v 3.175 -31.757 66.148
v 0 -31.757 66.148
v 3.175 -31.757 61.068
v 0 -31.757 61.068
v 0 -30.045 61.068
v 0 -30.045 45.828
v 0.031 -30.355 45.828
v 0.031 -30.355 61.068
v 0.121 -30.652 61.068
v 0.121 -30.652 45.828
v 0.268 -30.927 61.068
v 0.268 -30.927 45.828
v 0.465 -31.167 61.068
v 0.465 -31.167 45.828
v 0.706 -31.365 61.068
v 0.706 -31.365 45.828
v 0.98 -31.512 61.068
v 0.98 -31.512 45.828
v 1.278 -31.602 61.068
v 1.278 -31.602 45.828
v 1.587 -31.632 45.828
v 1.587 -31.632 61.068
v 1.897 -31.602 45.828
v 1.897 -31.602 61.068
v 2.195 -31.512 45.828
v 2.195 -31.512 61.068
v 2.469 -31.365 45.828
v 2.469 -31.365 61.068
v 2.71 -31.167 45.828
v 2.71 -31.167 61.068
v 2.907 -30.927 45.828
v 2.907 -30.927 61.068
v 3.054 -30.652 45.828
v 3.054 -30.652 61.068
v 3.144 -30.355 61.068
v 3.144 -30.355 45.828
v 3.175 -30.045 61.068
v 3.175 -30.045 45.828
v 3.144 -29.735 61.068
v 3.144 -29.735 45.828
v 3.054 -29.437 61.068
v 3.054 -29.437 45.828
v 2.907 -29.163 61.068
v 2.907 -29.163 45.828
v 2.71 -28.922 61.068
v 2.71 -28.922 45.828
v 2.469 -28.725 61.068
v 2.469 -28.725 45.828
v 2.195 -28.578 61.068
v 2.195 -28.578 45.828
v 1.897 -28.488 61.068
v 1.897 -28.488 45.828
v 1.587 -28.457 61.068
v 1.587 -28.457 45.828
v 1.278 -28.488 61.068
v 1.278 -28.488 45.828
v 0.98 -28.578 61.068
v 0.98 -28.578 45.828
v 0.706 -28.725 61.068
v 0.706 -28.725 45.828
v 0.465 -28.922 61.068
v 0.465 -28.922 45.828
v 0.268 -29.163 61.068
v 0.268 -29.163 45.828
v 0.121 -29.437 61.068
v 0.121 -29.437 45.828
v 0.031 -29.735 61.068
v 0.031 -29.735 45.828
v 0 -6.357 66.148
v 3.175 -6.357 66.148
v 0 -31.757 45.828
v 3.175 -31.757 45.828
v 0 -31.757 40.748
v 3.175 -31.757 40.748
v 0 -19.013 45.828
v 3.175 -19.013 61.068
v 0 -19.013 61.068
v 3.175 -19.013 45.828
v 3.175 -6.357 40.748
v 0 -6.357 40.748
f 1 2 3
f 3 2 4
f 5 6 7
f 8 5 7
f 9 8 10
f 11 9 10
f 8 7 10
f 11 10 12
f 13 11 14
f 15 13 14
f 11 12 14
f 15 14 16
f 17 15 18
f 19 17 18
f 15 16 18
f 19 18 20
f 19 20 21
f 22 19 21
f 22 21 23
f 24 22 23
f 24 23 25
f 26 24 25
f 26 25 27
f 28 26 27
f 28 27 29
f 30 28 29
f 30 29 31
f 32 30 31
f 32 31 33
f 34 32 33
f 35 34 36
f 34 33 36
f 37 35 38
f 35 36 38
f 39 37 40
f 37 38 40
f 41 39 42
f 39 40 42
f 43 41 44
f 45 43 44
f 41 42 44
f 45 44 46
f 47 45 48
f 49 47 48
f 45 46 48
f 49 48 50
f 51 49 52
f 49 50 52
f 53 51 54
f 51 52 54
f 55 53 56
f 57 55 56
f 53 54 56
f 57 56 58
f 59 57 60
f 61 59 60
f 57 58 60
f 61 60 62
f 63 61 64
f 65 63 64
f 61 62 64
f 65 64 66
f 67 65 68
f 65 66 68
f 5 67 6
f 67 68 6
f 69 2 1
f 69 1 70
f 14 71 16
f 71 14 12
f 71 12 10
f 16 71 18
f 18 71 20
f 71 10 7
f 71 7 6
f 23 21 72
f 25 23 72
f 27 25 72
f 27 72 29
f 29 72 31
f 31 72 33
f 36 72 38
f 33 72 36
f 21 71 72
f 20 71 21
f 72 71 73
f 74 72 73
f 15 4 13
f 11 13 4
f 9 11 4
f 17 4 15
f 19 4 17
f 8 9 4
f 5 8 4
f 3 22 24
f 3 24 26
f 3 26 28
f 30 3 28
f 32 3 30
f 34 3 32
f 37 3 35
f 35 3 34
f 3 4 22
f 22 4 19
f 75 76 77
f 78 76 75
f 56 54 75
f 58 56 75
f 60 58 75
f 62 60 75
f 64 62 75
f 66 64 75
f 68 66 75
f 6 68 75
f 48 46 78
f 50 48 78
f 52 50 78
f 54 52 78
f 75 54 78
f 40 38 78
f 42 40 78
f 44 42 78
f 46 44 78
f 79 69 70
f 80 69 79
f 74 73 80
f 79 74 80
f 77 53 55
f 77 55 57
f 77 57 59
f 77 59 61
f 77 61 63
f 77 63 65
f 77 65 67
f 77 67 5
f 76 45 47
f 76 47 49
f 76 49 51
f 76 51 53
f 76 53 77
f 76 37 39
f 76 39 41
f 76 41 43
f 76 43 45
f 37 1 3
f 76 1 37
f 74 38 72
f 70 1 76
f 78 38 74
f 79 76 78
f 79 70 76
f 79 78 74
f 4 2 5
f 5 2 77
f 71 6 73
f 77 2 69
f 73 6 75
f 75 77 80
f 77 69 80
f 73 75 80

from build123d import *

# Parameters (mm, degrees)
SKETCH1_W           = 25.4
SKETCH1_H           = 25.4
BOSS_EXTRUDE1_DEPTH = 3.175
SKETCH2_W           = 15.24
SKETCH2_H           = 12.744579596
CUT_EXTRUDE1_DEPTH  = 74.44478714
SKETCH3_R           = 1.5875
BOSS_EXTRUDE4_DEPTH = 15.24


with BuildPart() as part:
    # Sketch1 → Boss-Extrude1 (new body)
    with BuildSketch(Plane(origin=(0, 0, 0), x_dir=(0, 0, -1), z_dir=(1, 0, 0))):
        with Locations((-53.44770318, -19.057479388)):
            Rectangle(SKETCH1_W, SKETCH1_H)
    extrude(amount=BOSS_EXTRUDE1_DEPTH)

    # Sketch2 → Cut-Extrude1 (cut, through all)
    with BuildSketch(Plane(origin=(3.175, 0, 0), x_dir=(0, 0, -1), z_dir=(1, 0, 0))):
        with Locations((-53.44770318, -25.38518959)):
            Rectangle(SKETCH2_W, SKETCH2_H)
    extrude(amount=-CUT_EXTRUDE1_DEPTH, mode=Mode.SUBTRACT)

    # Sketch3 → Boss-Extrude4 (add)
    with BuildSketch(Plane.XY.offset(45.82770318)):
        with Locations(Location((1.5875, -30.04486866, 0), (0, 0, 180))):
            Circle(SKETCH3_R)
    extrude(amount=BOSS_EXTRUDE4_DEPTH)


solid = part.part
